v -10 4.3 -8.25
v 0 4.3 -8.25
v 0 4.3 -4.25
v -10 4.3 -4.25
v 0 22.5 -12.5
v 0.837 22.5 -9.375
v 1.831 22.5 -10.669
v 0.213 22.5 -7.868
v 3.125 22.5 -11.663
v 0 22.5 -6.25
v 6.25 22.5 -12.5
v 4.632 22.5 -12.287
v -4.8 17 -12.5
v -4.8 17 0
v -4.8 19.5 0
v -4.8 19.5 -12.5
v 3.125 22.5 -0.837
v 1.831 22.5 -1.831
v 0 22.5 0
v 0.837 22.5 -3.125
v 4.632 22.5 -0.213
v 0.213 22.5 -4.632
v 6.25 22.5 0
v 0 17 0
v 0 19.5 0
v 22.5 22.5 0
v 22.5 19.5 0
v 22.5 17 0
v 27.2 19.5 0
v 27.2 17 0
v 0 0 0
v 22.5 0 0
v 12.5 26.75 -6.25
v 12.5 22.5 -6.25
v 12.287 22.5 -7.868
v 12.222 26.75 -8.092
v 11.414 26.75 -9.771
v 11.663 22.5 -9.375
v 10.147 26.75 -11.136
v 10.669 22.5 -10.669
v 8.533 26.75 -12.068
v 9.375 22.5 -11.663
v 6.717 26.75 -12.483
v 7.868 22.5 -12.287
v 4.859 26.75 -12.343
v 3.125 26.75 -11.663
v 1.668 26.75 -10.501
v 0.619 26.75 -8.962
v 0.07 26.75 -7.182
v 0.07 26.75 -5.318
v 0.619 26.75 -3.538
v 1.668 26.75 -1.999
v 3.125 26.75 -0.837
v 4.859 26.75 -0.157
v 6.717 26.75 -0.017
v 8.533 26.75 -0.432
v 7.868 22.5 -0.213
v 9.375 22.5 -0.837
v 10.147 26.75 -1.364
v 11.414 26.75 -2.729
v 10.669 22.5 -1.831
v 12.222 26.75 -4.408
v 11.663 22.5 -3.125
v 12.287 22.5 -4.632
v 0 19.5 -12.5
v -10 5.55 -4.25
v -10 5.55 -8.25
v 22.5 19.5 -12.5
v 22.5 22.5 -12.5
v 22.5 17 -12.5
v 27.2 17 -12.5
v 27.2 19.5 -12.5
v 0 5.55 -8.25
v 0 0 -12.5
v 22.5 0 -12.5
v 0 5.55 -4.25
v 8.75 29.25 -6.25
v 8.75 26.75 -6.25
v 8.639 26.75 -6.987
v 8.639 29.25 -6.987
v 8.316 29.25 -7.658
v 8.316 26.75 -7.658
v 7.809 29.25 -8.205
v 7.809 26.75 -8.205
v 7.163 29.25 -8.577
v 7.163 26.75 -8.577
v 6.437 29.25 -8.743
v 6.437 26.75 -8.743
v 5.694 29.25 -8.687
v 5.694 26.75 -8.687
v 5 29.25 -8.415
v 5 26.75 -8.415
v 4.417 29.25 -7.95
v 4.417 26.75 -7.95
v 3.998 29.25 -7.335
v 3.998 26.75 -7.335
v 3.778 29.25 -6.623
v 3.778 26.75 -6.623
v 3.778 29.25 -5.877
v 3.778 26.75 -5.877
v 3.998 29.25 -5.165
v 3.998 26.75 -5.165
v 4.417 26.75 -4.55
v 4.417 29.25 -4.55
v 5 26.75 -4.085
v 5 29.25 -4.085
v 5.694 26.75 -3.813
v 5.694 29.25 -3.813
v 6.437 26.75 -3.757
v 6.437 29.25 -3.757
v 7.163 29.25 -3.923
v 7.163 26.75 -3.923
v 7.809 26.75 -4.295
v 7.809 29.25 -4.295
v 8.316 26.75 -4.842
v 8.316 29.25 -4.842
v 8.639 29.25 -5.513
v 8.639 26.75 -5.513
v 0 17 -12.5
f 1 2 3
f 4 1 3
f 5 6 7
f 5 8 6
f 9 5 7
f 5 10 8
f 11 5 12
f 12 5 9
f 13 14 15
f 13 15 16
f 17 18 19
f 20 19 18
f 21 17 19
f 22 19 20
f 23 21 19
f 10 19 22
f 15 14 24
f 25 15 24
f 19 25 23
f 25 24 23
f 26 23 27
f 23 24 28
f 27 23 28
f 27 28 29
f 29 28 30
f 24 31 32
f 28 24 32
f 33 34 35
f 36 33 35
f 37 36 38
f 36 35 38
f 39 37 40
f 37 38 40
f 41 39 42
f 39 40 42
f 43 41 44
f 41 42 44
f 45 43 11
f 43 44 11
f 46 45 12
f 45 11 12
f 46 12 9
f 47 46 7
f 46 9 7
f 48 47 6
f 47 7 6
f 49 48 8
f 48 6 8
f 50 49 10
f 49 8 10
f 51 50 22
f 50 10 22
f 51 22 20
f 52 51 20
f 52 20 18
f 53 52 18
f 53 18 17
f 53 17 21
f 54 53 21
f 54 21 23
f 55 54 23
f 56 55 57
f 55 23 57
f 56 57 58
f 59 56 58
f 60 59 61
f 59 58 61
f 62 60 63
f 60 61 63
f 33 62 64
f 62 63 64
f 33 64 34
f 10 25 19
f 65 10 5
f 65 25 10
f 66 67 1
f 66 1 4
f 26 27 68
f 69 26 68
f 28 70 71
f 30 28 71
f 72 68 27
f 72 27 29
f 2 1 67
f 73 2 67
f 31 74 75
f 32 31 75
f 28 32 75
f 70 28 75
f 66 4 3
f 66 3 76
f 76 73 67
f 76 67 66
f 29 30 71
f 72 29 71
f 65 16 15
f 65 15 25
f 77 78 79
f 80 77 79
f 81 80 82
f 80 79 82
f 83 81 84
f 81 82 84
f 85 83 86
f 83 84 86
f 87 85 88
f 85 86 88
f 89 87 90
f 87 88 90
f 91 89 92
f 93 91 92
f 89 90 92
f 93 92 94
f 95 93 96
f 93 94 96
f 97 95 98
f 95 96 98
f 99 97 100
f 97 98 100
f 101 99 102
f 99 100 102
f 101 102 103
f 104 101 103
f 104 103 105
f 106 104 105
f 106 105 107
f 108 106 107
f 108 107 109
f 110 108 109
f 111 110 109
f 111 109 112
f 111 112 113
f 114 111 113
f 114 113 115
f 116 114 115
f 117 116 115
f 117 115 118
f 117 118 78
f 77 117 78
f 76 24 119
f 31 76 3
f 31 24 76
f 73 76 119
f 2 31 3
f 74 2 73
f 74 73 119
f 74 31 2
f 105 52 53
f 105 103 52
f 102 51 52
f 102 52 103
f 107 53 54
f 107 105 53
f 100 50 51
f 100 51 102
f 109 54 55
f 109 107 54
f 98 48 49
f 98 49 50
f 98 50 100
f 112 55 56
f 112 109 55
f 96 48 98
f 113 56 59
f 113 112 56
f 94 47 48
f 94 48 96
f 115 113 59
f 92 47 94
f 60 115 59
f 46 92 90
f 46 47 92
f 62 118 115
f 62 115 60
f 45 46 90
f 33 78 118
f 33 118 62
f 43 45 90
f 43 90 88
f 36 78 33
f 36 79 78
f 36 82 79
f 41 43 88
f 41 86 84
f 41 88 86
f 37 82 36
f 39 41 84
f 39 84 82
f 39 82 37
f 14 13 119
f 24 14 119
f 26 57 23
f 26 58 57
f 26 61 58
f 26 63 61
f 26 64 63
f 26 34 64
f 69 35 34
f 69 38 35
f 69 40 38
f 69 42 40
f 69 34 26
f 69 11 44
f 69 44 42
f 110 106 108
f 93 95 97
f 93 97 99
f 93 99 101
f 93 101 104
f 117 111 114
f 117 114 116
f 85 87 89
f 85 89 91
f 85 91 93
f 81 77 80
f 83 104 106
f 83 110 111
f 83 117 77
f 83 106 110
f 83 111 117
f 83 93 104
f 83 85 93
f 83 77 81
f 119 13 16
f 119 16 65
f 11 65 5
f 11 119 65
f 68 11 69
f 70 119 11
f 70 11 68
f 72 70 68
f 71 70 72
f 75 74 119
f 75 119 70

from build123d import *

# Parameters (mm, degrees)
SKETCH1_W           = 22.5
SKETCH1_H           = 12.5
BOSS_EXTRUDE1_DEPTH = 22.5
BOSS_EXTRUDE2_START = 17
SKETCH1_3_W         = 4.8
SKETCH1_3_H         = 12.5
SKETCH1_3_W_2       = 4.7
BOSS_EXTRUDE2_DEPTH = 2.5
SKETCH2_R           = 6.25
BOSS_EXTRUDE3_DEPTH = 4.25
SKETCH2_3_R         = 2.5
BOSS_EXTRUDE4_DEPTH = 6.75
SKETCH3_W           = 4
SKETCH3_H           = 1.25
BOSS_EXTRUDE5_DEPTH = 10


with BuildPart() as part:
    # Sketch1 → Boss-Extrude1 (new body)
    with BuildSketch(Plane(origin=(0, 0, 0), x_dir=(1, 0, 0), z_dir=(0, 1, 0))):
        with Locations((11.25, 6.25)):
            Rectangle(SKETCH1_W, SKETCH1_H)
    extrude(amount=BOSS_EXTRUDE1_DEPTH)

    # Sketch1<3> → Boss-Extrude2 (add)
    with BuildSketch(Plane(origin=(0, 0, 0), x_dir=(1, 0, 0), z_dir=(0, 1, 0)).offset(BOSS_EXTRUDE2_START)):
        with Locations((-2.4, 6.25)):
            Rectangle(SKETCH1_3_W, SKETCH1_3_H)
        with Locations((24.85, 6.25)):
            Rectangle(SKETCH1_3_W_2, SKETCH1_3_H)
    extrude(amount=BOSS_EXTRUDE2_DEPTH)

    # Sketch2 → Boss-Extrude3 (add)
    with BuildSketch(Plane(origin=(0, 22.5, 0), x_dir=(1, 0, 0), z_dir=(0, 1, 0))):
        with Locations((6.25, 6.25)):
            Circle(SKETCH2_R)
    extrude(amount=BOSS_EXTRUDE3_DEPTH)

    # Sketch2<3> → Boss-Extrude4 (add)
    with BuildSketch(Plane(origin=(0, 22.5, 0), x_dir=(1, 0, 0), z_dir=(0, 1, 0))):
        with Locations((6.25, 6.25)):
            Circle(SKETCH2_3_R)
    extrude(amount=BOSS_EXTRUDE4_DEPTH)

    # Sketch3 → Boss-Extrude5 (add)
    with BuildSketch(Plane.ZY):
        with Locations((-6.25, 4.925)):
            Rectangle(SKETCH3_W, SKETCH3_H)
    extrude(amount=BOSS_EXTRUDE5_DEPTH)


solid = part.part
